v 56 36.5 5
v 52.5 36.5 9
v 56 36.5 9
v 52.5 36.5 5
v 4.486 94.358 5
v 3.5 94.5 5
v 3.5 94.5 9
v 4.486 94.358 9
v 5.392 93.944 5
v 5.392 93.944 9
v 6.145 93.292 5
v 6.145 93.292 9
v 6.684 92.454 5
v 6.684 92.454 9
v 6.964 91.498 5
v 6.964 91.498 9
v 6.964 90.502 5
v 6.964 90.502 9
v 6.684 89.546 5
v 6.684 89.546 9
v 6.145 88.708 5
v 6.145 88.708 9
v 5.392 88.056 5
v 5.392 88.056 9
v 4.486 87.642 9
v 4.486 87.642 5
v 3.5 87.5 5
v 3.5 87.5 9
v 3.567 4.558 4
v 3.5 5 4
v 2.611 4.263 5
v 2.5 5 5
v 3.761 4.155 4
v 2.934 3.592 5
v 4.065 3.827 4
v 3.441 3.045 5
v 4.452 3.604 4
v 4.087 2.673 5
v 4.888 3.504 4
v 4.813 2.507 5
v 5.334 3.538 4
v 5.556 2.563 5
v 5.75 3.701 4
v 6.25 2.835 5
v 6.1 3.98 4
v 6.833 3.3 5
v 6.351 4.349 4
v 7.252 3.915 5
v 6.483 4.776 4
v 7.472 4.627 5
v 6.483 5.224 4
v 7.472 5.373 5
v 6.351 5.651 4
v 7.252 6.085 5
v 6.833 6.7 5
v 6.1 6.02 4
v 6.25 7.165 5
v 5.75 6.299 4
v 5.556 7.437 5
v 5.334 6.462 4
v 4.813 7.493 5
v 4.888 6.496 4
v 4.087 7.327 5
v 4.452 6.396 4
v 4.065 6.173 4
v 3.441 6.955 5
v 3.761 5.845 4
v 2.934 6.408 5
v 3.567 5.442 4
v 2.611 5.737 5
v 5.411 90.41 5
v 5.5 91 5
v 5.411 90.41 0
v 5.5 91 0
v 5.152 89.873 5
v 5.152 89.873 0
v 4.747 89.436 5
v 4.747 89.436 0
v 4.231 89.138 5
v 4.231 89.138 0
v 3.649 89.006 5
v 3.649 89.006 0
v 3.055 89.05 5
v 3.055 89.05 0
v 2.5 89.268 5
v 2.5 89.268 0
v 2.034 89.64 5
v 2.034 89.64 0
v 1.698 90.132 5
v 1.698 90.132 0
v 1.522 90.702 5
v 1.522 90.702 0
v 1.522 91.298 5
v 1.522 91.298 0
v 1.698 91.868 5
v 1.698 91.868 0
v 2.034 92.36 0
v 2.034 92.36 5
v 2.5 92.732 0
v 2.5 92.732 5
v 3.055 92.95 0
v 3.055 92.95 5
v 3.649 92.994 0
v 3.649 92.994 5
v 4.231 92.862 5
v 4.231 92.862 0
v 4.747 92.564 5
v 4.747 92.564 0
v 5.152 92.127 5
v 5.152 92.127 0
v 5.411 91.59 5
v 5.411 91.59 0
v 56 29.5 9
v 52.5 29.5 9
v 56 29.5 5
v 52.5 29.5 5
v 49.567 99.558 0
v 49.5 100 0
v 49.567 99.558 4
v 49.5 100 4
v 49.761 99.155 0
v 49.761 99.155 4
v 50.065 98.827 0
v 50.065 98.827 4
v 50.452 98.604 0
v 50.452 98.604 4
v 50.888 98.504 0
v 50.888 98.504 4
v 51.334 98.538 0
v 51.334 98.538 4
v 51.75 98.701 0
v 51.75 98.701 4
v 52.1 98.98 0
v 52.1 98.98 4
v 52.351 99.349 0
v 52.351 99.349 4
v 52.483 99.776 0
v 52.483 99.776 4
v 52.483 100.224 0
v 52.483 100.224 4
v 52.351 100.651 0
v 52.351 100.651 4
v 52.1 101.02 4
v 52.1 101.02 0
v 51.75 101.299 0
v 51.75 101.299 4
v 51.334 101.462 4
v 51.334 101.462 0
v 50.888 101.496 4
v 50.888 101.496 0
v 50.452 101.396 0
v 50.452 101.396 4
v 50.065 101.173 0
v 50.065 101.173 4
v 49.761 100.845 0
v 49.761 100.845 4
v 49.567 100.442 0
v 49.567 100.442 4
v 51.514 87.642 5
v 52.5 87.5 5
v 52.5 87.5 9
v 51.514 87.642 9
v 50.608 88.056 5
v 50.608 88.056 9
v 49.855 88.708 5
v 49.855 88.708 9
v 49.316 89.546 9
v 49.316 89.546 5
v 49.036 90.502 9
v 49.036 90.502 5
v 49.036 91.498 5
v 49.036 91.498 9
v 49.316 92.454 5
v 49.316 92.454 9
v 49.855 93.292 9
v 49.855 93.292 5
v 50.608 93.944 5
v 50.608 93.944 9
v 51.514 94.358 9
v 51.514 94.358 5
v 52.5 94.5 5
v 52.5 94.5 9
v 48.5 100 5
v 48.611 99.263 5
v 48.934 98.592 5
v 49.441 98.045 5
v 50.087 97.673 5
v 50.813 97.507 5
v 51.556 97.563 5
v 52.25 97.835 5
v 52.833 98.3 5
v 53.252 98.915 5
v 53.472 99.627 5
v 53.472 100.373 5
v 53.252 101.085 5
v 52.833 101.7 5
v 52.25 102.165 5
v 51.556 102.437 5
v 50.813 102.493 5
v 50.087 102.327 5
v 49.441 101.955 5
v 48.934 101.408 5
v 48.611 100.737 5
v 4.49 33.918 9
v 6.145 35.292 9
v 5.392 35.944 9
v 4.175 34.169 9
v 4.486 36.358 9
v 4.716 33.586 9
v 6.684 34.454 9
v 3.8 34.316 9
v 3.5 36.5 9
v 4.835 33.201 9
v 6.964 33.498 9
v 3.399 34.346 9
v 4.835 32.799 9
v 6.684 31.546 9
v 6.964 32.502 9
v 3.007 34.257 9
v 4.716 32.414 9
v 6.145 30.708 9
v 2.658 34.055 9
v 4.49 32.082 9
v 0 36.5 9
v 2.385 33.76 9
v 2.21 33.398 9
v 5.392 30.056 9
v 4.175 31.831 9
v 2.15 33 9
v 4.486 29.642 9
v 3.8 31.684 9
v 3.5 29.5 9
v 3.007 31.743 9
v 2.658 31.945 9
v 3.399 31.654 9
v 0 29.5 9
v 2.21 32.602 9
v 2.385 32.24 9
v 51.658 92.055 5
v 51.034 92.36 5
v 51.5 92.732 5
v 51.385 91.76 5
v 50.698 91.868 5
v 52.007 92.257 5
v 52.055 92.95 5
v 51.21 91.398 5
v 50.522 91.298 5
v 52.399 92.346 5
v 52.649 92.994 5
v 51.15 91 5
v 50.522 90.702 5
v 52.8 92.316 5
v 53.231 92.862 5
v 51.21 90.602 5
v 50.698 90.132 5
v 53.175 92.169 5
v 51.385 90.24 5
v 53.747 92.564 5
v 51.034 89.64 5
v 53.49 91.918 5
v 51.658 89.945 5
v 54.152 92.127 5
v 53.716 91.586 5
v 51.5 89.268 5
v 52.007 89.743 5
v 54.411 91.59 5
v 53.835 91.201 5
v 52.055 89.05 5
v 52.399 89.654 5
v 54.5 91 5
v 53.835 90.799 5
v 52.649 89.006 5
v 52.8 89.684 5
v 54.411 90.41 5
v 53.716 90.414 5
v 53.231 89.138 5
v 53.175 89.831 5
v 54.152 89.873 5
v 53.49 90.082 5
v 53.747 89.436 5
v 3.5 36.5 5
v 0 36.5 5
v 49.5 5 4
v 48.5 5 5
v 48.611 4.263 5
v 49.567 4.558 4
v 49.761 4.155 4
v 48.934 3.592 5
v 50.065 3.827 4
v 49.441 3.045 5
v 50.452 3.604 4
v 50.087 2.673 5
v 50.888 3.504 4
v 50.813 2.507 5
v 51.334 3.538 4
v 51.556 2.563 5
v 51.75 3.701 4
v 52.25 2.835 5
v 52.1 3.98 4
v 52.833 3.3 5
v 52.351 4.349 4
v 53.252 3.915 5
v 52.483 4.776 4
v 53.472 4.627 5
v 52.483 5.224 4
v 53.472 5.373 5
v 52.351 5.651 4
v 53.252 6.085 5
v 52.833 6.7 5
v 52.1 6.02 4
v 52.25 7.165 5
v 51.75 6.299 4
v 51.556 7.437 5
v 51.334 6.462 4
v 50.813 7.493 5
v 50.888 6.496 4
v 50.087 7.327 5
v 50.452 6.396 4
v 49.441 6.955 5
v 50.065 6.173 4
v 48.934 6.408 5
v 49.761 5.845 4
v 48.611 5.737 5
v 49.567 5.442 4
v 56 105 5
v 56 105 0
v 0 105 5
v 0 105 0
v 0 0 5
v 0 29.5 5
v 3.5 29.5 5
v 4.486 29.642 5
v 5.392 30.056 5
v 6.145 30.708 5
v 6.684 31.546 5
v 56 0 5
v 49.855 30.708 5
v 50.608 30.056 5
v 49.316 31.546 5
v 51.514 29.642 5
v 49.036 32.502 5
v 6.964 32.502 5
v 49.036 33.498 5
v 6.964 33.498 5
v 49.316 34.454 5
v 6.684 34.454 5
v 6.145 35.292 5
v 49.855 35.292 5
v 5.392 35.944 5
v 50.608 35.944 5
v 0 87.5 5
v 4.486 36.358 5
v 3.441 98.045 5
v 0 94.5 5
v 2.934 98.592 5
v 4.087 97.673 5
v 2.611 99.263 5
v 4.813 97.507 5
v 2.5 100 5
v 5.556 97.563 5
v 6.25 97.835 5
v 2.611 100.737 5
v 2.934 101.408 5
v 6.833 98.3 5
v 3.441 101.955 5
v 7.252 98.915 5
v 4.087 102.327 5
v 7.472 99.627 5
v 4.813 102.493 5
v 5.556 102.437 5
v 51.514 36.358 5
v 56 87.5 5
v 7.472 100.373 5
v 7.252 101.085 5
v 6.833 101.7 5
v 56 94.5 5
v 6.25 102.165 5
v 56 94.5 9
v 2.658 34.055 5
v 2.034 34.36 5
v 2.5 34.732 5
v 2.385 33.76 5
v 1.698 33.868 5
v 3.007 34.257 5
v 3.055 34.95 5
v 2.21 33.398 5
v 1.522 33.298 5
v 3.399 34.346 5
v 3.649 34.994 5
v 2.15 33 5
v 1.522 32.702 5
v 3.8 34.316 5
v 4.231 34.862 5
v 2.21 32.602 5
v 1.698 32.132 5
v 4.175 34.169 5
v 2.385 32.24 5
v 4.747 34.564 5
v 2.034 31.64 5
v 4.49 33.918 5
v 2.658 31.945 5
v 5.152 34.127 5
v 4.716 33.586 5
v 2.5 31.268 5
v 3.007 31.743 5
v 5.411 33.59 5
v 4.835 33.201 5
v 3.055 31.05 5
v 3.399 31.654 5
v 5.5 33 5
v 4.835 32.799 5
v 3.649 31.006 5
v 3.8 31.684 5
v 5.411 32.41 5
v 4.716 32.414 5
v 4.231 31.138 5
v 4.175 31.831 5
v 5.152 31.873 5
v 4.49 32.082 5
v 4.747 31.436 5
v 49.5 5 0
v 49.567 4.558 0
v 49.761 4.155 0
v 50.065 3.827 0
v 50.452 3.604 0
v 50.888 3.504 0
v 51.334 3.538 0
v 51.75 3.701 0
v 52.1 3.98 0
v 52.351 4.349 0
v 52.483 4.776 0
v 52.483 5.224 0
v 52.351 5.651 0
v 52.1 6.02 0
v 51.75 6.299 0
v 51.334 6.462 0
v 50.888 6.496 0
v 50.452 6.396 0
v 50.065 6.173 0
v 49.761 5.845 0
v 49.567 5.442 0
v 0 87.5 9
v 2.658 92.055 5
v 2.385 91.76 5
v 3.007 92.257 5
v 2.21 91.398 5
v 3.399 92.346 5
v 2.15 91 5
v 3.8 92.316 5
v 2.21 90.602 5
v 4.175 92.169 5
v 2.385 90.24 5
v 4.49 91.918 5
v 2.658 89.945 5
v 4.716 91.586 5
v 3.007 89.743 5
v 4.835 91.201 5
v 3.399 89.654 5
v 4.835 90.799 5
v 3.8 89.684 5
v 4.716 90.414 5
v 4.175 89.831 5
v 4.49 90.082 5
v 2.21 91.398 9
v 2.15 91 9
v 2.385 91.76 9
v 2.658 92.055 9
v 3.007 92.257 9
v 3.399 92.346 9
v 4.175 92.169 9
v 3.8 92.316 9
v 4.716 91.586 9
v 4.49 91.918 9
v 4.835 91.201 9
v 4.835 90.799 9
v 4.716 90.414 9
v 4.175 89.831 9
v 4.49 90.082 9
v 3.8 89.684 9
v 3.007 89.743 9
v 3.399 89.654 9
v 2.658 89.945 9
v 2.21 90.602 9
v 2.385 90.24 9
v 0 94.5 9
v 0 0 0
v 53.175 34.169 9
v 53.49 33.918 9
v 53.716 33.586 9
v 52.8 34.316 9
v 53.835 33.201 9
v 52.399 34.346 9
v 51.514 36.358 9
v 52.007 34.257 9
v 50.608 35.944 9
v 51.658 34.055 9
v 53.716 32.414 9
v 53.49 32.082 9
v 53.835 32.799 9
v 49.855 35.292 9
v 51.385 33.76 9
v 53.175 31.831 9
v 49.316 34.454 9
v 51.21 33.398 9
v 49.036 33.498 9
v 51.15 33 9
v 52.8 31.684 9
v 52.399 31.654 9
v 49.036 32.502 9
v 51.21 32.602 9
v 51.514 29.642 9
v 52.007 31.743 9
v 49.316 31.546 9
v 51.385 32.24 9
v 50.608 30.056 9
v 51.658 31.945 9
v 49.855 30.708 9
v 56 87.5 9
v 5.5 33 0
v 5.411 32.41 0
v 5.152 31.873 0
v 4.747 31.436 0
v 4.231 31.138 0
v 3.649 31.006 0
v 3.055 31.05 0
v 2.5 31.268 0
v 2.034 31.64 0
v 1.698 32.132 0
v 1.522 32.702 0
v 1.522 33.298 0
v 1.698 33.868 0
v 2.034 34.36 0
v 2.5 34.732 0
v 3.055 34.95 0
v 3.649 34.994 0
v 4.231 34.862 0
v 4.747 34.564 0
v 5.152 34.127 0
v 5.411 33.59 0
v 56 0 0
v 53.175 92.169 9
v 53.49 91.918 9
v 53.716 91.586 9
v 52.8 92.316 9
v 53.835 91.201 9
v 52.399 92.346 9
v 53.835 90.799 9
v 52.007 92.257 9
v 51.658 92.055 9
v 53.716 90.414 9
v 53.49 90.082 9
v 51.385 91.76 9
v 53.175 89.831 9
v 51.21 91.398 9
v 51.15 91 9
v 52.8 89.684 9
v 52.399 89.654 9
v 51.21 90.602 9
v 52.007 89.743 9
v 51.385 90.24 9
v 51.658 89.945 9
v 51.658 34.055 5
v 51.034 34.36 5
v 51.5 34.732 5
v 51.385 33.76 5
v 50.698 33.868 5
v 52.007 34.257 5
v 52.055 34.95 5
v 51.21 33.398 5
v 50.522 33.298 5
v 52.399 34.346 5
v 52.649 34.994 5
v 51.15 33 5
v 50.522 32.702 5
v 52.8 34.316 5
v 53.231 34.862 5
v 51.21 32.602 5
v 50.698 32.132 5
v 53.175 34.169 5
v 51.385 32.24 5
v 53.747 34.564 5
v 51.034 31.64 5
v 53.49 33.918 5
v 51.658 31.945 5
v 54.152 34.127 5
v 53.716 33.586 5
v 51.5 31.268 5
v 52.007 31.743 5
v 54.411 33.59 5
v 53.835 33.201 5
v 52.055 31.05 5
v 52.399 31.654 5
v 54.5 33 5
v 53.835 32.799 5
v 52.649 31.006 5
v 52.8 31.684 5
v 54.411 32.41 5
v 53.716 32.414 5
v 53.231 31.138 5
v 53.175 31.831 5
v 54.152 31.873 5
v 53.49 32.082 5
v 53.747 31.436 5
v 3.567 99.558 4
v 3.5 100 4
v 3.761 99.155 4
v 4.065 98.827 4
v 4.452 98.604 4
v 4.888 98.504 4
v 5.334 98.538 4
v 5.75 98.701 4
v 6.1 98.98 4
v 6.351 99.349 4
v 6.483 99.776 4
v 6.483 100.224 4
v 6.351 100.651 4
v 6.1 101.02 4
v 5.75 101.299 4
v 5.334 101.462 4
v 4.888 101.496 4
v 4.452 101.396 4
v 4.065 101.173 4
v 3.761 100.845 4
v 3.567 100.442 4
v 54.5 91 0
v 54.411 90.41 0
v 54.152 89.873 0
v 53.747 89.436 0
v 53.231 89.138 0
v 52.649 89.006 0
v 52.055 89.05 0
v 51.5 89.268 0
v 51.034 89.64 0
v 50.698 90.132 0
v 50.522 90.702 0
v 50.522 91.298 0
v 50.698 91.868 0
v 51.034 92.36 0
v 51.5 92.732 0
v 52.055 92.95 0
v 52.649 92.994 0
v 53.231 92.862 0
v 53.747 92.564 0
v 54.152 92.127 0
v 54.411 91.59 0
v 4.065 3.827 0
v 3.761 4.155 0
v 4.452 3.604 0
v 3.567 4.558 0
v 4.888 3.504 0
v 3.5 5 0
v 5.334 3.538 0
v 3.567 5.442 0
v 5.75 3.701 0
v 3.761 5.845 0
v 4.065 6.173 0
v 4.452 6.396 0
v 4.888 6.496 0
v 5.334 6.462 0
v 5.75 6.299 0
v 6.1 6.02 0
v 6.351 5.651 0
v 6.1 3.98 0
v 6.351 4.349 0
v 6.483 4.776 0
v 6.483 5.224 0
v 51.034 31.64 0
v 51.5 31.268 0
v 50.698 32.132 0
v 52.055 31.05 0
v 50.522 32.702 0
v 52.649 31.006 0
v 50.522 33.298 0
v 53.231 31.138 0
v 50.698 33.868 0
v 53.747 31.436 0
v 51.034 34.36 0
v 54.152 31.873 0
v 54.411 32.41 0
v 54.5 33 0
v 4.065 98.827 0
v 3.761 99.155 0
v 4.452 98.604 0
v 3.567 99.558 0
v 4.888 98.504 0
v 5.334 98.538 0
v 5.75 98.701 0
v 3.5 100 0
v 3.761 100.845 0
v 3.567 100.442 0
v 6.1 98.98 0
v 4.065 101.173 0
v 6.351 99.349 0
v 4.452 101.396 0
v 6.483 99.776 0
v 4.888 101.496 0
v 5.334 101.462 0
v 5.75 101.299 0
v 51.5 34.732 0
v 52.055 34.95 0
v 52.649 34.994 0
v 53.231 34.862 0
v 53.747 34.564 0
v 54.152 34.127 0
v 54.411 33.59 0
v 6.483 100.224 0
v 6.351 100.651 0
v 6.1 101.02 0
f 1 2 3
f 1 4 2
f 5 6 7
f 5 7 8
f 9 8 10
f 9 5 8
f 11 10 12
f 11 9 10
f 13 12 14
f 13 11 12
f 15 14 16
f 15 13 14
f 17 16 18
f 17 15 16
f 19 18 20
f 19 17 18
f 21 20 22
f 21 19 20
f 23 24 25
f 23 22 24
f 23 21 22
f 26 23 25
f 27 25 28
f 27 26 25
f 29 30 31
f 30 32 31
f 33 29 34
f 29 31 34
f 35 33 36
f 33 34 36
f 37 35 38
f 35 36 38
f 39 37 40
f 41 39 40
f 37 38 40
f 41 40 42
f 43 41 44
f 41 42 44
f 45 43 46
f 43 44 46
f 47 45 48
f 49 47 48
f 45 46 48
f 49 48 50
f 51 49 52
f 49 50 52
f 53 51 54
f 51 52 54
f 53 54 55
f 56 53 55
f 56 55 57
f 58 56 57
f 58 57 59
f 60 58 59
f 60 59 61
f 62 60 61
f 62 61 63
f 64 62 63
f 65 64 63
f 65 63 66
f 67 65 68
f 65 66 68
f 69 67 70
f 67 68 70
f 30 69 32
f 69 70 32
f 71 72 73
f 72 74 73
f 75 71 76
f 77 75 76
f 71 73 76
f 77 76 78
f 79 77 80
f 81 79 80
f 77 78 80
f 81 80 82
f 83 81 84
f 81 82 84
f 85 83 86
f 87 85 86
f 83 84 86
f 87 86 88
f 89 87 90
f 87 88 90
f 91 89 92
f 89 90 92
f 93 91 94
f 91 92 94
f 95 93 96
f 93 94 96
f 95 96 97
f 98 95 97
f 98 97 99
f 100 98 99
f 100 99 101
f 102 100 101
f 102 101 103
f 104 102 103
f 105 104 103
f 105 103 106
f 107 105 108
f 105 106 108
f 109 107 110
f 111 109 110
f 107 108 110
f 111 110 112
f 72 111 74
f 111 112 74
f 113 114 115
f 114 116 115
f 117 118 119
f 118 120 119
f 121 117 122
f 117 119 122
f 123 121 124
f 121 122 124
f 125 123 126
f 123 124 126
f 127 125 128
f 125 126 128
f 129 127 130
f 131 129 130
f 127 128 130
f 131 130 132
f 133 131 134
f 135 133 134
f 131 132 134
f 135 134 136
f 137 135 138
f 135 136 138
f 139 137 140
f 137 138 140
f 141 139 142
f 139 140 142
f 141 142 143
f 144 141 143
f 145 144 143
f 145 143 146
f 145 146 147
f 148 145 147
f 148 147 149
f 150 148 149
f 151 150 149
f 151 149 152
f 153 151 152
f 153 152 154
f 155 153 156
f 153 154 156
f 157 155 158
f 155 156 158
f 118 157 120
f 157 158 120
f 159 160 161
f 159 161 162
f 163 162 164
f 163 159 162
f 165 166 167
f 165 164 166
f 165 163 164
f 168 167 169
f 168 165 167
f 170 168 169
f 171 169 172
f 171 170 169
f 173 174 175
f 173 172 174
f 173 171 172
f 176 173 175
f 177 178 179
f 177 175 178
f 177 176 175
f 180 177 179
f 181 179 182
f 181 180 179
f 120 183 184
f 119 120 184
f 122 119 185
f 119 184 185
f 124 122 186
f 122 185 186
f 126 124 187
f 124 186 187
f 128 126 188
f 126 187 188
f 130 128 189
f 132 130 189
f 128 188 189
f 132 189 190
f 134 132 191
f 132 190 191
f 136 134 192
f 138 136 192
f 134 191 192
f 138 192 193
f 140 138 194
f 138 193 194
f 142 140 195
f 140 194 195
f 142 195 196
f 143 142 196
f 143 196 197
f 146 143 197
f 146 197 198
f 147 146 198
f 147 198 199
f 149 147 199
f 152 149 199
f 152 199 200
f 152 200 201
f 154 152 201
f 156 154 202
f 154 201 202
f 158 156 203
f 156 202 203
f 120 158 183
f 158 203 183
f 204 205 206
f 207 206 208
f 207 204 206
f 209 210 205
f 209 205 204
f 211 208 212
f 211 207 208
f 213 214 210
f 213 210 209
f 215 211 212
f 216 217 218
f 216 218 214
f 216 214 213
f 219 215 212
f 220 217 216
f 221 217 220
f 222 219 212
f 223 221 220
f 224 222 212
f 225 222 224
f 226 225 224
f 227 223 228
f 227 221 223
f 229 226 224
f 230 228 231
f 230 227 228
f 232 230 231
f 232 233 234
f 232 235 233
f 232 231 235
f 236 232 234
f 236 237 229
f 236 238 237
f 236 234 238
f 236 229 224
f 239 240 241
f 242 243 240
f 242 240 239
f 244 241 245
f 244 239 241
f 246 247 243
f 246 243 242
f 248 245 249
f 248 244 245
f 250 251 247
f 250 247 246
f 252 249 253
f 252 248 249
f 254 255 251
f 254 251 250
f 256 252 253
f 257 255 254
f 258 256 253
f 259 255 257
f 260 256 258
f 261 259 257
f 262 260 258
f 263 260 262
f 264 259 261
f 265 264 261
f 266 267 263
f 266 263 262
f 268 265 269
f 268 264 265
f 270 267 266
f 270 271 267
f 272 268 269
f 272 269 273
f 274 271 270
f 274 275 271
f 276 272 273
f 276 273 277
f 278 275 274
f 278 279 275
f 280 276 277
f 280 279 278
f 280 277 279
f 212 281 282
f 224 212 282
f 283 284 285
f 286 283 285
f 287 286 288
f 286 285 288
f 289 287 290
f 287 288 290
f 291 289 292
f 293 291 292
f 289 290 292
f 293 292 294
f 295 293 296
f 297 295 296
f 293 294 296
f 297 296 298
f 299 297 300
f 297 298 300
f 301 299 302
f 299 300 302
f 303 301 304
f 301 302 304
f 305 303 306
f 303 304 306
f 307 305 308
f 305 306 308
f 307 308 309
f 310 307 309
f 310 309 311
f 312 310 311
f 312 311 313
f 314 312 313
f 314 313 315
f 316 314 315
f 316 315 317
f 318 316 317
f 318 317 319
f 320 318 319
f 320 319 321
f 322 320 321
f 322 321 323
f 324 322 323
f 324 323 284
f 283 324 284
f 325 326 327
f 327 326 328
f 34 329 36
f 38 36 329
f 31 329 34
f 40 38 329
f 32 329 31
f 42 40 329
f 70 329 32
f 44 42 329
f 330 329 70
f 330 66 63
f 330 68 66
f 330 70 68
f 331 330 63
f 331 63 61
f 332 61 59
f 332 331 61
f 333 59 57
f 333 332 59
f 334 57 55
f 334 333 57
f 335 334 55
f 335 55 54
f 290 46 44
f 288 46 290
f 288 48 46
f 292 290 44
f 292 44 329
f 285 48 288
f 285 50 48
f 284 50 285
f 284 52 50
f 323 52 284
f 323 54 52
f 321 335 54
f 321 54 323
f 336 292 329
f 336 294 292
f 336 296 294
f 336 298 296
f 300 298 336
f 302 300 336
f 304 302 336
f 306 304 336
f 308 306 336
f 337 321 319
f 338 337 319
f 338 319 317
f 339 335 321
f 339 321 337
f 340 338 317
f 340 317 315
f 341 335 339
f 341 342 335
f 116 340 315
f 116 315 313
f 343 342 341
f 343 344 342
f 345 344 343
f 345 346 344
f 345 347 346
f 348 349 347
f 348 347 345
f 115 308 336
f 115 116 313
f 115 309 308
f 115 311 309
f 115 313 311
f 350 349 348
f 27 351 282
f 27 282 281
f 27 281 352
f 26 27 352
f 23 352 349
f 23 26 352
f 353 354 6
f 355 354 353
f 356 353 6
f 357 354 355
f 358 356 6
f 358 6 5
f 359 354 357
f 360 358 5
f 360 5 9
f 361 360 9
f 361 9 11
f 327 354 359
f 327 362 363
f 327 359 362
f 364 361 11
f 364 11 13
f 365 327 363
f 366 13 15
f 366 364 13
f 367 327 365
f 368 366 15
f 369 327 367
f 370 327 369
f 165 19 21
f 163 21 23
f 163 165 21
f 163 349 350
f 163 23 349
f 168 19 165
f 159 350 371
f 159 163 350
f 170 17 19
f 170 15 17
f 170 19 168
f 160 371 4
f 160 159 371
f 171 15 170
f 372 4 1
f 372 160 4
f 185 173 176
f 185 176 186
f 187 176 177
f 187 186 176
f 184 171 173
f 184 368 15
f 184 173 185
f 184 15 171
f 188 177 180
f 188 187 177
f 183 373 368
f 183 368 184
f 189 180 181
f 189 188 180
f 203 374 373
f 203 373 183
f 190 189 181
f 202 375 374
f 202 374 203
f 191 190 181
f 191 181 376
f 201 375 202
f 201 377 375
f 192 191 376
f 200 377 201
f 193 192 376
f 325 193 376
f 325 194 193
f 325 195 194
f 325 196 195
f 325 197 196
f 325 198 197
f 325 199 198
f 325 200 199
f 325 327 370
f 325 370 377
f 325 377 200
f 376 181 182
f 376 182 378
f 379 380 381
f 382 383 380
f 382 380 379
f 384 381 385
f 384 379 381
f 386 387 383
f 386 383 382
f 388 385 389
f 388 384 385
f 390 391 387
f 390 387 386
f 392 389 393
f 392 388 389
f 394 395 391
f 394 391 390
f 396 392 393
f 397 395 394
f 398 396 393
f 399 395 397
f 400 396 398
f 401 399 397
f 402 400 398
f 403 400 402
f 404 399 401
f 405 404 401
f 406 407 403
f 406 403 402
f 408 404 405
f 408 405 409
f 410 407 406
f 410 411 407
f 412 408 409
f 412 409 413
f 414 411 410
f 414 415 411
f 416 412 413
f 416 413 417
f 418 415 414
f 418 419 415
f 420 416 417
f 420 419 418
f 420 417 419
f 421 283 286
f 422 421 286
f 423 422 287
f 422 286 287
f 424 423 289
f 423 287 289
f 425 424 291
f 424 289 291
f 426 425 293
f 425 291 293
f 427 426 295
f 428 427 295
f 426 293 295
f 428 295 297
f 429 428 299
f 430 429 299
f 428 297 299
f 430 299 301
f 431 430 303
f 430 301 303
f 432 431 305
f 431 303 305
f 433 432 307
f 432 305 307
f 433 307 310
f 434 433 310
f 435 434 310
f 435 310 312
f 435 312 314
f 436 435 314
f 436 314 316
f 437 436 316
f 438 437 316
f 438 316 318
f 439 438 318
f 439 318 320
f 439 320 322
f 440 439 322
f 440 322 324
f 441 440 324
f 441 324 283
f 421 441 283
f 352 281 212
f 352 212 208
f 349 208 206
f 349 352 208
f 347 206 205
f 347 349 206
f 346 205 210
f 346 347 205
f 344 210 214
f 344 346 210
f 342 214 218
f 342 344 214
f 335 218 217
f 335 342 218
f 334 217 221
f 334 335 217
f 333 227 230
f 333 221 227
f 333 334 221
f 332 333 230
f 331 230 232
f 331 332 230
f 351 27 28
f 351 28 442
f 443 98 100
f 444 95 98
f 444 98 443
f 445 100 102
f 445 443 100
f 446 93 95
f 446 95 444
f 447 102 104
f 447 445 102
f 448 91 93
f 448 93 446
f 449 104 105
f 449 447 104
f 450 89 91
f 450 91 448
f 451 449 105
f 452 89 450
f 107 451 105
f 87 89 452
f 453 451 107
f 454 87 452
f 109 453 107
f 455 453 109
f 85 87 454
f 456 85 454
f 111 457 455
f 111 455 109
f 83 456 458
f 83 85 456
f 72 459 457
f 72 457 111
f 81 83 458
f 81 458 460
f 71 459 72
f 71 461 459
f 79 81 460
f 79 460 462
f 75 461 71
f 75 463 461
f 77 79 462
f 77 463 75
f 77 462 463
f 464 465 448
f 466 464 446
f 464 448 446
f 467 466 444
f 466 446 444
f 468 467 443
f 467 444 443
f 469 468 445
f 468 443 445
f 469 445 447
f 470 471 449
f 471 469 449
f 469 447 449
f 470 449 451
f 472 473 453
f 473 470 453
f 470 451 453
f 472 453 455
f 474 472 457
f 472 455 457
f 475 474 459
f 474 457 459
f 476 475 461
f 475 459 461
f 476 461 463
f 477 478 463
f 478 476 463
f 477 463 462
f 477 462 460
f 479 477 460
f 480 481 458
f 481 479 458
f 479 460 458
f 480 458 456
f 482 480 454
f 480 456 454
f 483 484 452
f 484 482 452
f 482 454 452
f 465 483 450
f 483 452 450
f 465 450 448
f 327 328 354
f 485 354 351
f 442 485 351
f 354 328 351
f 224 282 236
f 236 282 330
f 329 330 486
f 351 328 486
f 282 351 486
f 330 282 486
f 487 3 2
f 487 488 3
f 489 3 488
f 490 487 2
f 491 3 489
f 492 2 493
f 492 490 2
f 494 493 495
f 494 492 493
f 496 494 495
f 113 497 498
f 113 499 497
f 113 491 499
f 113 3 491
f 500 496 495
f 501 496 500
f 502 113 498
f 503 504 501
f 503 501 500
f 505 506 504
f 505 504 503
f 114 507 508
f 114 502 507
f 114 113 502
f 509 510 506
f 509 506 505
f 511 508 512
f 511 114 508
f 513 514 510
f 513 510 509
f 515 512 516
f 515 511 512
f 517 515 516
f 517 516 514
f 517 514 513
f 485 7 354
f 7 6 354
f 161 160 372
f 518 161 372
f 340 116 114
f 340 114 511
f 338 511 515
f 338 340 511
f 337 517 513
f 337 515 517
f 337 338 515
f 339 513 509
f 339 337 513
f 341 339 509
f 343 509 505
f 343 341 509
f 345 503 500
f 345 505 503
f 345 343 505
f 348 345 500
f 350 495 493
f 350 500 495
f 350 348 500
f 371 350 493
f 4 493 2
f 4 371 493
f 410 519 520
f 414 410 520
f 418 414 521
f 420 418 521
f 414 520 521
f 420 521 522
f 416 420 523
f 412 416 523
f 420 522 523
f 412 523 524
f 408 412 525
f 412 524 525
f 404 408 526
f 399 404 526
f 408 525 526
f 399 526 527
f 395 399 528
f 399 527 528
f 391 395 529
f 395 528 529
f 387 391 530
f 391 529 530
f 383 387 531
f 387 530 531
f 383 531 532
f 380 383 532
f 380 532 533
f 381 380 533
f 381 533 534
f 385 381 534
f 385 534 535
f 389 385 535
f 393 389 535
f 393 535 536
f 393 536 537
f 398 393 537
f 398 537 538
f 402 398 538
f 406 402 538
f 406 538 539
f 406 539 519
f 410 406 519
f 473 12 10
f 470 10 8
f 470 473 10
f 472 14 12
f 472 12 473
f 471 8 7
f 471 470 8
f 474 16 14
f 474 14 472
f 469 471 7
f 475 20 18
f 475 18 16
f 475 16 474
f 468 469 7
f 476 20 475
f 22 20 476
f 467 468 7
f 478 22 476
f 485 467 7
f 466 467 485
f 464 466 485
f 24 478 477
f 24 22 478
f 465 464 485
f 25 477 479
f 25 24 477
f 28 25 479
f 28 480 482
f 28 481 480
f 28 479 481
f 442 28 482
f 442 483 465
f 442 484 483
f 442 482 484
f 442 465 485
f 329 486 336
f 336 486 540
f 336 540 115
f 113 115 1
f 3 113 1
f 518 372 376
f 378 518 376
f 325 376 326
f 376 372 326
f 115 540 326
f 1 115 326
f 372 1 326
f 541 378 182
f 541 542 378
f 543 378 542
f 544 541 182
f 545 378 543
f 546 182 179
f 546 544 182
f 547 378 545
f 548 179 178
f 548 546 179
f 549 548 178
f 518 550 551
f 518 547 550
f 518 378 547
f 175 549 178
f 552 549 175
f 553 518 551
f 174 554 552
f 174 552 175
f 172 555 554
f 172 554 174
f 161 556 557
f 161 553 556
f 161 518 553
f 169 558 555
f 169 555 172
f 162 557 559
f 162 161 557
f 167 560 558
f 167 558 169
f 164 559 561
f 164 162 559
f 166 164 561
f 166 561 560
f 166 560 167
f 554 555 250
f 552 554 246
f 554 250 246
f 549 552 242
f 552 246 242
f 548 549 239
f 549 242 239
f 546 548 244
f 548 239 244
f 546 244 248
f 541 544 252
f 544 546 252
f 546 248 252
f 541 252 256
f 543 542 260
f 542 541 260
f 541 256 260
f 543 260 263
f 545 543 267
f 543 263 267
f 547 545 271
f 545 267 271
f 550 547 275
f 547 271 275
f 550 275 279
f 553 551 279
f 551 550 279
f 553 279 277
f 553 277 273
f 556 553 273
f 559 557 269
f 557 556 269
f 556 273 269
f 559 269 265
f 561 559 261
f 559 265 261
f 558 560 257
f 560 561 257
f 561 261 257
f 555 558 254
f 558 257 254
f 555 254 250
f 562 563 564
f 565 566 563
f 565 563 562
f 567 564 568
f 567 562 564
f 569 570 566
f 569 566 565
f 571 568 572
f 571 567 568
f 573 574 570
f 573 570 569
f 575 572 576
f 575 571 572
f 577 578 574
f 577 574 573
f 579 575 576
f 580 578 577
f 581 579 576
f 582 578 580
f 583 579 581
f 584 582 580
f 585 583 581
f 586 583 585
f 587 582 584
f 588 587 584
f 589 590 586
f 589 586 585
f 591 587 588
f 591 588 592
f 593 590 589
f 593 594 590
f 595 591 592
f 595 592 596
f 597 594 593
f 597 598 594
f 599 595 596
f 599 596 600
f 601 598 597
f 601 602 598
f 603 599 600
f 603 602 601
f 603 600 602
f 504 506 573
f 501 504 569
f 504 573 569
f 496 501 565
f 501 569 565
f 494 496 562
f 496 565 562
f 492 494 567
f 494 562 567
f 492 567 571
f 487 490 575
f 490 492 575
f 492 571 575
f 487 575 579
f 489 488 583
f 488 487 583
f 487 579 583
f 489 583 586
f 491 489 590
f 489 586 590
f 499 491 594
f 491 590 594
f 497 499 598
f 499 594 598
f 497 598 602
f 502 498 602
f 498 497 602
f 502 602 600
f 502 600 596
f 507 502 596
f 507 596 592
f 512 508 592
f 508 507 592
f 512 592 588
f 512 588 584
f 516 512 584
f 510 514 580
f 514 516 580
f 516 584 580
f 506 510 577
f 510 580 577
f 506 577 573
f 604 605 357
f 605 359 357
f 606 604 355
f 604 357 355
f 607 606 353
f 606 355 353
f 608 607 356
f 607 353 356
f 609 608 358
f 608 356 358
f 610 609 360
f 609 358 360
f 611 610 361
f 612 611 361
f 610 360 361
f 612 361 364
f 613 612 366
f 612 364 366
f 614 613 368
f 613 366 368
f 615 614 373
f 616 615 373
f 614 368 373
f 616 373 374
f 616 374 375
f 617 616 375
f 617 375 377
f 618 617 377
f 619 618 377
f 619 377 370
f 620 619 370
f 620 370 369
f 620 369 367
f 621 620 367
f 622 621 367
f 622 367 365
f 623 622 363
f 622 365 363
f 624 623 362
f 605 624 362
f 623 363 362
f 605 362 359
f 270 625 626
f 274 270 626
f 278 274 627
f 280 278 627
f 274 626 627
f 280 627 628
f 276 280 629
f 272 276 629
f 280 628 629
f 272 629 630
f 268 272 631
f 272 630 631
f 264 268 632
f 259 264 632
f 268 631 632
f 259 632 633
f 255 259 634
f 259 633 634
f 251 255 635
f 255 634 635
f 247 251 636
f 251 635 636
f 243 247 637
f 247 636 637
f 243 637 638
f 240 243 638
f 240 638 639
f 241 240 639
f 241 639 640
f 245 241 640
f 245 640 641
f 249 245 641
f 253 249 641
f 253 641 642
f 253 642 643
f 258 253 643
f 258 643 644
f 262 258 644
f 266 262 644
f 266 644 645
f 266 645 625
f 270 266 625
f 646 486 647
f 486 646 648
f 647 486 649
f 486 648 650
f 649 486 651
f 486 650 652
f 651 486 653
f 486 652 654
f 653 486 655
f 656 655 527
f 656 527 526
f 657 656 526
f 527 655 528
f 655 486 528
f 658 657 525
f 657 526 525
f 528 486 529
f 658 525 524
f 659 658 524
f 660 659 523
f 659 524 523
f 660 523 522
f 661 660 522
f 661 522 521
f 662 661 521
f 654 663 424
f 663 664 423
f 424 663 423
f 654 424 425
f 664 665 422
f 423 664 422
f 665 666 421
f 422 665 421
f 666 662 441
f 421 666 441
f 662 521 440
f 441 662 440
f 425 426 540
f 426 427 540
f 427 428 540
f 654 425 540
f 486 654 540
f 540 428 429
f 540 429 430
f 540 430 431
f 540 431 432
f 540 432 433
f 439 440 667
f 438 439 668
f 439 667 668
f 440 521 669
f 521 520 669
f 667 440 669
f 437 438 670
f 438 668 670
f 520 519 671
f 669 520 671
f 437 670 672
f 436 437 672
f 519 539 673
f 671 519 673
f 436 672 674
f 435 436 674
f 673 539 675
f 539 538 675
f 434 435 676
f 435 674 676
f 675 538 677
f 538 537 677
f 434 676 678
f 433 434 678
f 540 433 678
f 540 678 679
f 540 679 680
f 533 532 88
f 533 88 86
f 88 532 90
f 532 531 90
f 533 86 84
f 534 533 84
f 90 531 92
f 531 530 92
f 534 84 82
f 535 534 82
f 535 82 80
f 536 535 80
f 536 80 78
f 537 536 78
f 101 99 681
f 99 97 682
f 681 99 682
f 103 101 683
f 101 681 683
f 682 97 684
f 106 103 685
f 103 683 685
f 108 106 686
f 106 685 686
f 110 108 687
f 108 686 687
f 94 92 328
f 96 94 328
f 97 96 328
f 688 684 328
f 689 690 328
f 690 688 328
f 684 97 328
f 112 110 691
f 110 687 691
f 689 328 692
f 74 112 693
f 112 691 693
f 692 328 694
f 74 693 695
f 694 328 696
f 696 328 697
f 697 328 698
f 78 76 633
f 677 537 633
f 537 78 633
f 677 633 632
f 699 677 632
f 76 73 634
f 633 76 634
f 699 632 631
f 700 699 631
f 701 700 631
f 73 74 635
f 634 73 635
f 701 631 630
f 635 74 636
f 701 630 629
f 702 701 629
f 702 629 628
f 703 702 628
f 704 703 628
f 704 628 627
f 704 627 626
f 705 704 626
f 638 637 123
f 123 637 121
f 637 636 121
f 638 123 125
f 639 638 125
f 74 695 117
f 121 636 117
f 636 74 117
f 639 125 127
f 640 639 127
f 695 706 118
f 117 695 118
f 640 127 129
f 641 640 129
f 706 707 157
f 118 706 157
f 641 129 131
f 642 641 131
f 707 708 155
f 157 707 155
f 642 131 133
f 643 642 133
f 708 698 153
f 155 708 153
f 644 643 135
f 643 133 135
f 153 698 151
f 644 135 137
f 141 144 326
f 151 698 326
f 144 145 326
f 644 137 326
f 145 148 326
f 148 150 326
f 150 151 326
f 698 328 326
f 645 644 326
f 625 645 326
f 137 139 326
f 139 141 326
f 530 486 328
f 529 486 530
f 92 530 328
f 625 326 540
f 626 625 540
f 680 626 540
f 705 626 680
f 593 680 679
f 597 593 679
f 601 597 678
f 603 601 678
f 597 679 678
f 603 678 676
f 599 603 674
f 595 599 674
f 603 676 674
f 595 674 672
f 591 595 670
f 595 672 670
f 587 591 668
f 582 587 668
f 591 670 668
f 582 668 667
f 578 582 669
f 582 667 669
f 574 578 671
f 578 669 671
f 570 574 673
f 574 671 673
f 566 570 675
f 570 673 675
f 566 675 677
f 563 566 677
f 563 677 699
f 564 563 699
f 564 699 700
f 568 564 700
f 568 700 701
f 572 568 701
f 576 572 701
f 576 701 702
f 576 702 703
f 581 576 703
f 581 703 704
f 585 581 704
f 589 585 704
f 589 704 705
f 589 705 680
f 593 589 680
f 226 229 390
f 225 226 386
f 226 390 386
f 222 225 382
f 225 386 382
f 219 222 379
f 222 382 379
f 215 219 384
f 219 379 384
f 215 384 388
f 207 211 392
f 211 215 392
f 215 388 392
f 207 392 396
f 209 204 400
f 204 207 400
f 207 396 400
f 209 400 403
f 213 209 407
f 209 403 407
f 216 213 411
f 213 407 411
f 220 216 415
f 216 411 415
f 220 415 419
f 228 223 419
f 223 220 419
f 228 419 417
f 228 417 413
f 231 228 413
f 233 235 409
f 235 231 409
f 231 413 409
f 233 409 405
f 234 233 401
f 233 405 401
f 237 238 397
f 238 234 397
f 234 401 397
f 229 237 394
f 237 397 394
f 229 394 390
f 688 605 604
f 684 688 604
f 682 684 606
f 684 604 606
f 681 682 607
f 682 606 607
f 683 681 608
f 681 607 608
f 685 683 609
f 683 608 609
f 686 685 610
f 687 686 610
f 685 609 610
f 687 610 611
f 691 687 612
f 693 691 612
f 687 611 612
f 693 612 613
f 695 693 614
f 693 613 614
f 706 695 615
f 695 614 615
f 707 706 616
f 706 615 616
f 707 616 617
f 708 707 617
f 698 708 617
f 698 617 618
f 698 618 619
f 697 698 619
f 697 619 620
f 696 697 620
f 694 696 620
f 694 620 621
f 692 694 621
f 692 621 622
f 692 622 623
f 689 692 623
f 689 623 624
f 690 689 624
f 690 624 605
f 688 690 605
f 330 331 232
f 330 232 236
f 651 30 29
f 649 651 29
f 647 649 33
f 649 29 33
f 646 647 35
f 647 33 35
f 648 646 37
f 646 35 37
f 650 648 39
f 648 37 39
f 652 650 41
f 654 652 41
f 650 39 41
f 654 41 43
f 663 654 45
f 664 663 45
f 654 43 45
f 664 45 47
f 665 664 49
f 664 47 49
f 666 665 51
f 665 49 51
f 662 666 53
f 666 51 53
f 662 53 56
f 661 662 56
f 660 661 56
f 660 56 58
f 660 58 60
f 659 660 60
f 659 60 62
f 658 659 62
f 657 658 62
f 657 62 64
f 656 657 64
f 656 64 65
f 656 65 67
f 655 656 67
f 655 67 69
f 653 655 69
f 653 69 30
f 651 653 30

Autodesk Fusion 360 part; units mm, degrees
sketch "Sketch1" plane through (0, 0, 0) normal (0, 0, 1) x (1, 0, 0)
  line L0 (0, 0) -> (56, 0)
  line L1 (56, 0) -> (56, 105)
  line L2 (56, 105) -> (0, 105)
  line L3 (0, 105) -> (0, 0)
  dimension "d1" = 56
  dimension "d2" = 105
extrude "Extrude1" add sketch "Sketch1" along normal blind 5
sketch "Sketch2" plane through (0, 0, 5) normal (0, 0, 1) x (-1, 0, 0)
  line L0 (0, -105) -> (0, 0)
  line L1 (0, 0) -> (-56, 0)
  line L2 (-56, 0) -> (-56, -105)
  line L3 (-56, -105) -> (0, -105)
  circle A0 centre (-3.5, -91) radius 1.35
  circle A1 centre (-52.5, -91) radius 1.35
  circle A2 centre (-3.5, -33) radius 1.35
  circle A3 centre (-52.5, -33) radius 1.35
  circle A4 centre (-3.5, -91) radius 3.5
  circle A5 centre (-52.5, -91) radius 3.5
  circle A6 centre (-52.5, -33) radius 3.5
  circle A7 centre (-3.5, -33) radius 3.5
  line L4 (-3.5, -36.5) -> (0, -36.5)
  line L5 (-3.5, -29.5) -> (0, -29.5)
  line L6 (-52.5, -29.5) -> (-56, -29.5)
  line L7 (-52.5, -87.5) -> (-56, -87.5)
  line L8 (-52.5, -94.5) -> (-56, -94.5)
  line L9 (-3.5, -94.5) -> (0, -94.5)
  line L10 (-3.5, -87.5) -> (0, -87.5)
  line L11 (-52.5, -36.5) -> (-56, -36.5)
  dimension "d5" = 2.7
  dimension "d6" = 58
  dimension "d7" = 49
  dimension "d8" = 3.5
  dimension "d9" = 56
  dimension "d10" = 105
  dimension "d11" = 33
extrude "Extrude2" add sketch "Sketch2" along normal blind 4 contours L0 A4 L9 | L0 A4 L10 | A4 | L2 A5 L8 | L2 A5 L7 | A5 | L0 A7 L4 | L0 A7 L5 | A7 | L2 A6 L11 | L2 A6 L6 | A6
extrude "Extrude3" cut sketch "Sketch2" against normal blind 7 contours A0 | A1 | A2 | A3
sketch "Sketch3" plane through (0, 0, 5) normal (0, 0, 1) x (-1, 0, 0)
  line L0 (-3.5, -29.5) -> (0, -29.5)
  line L1 (0, -29.5) -> (0, 0)
  line L2 (0, 0) -> (-56, 0)
  line L3 (-56, 0) -> (-56, -29.5)
  line L4 (-56, -29.5) -> (-52.5, -29.5)
  arc A0 (-52.5, -36.5) -> (-52.5, -29.5) centre (-52.5, -33) ccw
  line L5 (-52.5, -36.5) -> (-56, -36.5)
  line L6 (-56, -36.5) -> (-56, -87.5)
  line L7 (-56, -87.5) -> (-52.5, -87.5)
  arc A1 (-52.5, -94.5) -> (-52.5, -87.5) centre (-52.5, -91) ccw
  line L8 (-52.5, -94.5) -> (-56, -94.5)
  line L9 (-56, -94.5) -> (-56, -105)
  line L10 (-56, -105) -> (0, -105)
  line L11 (0, -105) -> (0, -94.5)
  line L12 (0, -94.5) -> (-3.5, -94.5)
  arc A2 (-3.5, -87.5) -> (-3.5, -94.5) centre (-3.5, -91) ccw
  line L13 (-3.5, -87.5) -> (0, -87.5)
  line L14 (0, -87.5) -> (0, -36.5)
  line L15 (0, -36.5) -> (-3.5, -36.5)
  arc A3 (-3.5, -29.5) -> (-3.5, -36.5) centre (-3.5, -33) ccw
  circle A4 centre (-5, -5) radius 1.5
  circle A5 centre (-51, -5) radius 1.5
  circle A6 centre (-51, -100) radius 1.5
  circle A7 centre (-5, -100) radius 1.5
  dimension "d16" = 5
  dimension "d17" = 5
  dimension "d18" = 5
  dimension "d19" = 3
  dimension "d20" = 5
extrude "Extrude4" cut sketch "Sketch3" against normal blind 5 contours A4 | A5 | A6 | A7
chamfer "Chamfer1" distance 1 distance2 1 4 edges at (6.3985, 4.4576, 5) (52.3985, 4.4576, 5) (52.3985, 99.4576, 5) (6.3985, 99.4576, 5) measured on face at (35.3731, 53.1886, 5) measured on face at (35.3731, 53.1886, 5) measured on face at (35.3731, 53.1886, 5) measured on face at (35.3731, 53.1886, 5)
sketch "Sketch4" plane through (0, 0, 0) normal (0, 0, -1) x (1, 0, 0)
  circle A0 centre (51, -100) radius 1.5
  circle A1 centre (5, -5) radius 1.5
  circle A2 centre (5, -100) radius 1.5
  circle A3 centre (51, -5) radius 1.5
  circle A4 centre (3.5, -91) radius 1.35
  circle A5 centre (52.5, -91) radius 1.35
  circle A6 centre (3.5, -33) radius 1.35
  circle A7 centre (52.5, -33) radius 1.35
  line L0 (0, 0) -> (0, -105)
  line L1 (0, -105) -> (56, -105)
  line L2 (56, -105) -> (56, 0)
  line L3 (56, 0) -> (0, 0)
  circle A8 centre (3.5, -91) radius 2
  circle A9 centre (52.5, -91) radius 2
  circle A10 centre (52.5, -33) radius 2
  circle A11 centre (3.5, -33) radius 2
  dimension "d25" = 4
extrude "Extrude5" cut sketch "Sketch4" against normal blind 5 contours A8 | A9 | A10 | A11
equation "d2 = 85 mm + 20 mm"
equation "d8 = ( d9 - d7 ) / 2"
equation "d11 = 23 mm + 10 mm"
equation "d17 = d16"
equation "d18 = d16"
